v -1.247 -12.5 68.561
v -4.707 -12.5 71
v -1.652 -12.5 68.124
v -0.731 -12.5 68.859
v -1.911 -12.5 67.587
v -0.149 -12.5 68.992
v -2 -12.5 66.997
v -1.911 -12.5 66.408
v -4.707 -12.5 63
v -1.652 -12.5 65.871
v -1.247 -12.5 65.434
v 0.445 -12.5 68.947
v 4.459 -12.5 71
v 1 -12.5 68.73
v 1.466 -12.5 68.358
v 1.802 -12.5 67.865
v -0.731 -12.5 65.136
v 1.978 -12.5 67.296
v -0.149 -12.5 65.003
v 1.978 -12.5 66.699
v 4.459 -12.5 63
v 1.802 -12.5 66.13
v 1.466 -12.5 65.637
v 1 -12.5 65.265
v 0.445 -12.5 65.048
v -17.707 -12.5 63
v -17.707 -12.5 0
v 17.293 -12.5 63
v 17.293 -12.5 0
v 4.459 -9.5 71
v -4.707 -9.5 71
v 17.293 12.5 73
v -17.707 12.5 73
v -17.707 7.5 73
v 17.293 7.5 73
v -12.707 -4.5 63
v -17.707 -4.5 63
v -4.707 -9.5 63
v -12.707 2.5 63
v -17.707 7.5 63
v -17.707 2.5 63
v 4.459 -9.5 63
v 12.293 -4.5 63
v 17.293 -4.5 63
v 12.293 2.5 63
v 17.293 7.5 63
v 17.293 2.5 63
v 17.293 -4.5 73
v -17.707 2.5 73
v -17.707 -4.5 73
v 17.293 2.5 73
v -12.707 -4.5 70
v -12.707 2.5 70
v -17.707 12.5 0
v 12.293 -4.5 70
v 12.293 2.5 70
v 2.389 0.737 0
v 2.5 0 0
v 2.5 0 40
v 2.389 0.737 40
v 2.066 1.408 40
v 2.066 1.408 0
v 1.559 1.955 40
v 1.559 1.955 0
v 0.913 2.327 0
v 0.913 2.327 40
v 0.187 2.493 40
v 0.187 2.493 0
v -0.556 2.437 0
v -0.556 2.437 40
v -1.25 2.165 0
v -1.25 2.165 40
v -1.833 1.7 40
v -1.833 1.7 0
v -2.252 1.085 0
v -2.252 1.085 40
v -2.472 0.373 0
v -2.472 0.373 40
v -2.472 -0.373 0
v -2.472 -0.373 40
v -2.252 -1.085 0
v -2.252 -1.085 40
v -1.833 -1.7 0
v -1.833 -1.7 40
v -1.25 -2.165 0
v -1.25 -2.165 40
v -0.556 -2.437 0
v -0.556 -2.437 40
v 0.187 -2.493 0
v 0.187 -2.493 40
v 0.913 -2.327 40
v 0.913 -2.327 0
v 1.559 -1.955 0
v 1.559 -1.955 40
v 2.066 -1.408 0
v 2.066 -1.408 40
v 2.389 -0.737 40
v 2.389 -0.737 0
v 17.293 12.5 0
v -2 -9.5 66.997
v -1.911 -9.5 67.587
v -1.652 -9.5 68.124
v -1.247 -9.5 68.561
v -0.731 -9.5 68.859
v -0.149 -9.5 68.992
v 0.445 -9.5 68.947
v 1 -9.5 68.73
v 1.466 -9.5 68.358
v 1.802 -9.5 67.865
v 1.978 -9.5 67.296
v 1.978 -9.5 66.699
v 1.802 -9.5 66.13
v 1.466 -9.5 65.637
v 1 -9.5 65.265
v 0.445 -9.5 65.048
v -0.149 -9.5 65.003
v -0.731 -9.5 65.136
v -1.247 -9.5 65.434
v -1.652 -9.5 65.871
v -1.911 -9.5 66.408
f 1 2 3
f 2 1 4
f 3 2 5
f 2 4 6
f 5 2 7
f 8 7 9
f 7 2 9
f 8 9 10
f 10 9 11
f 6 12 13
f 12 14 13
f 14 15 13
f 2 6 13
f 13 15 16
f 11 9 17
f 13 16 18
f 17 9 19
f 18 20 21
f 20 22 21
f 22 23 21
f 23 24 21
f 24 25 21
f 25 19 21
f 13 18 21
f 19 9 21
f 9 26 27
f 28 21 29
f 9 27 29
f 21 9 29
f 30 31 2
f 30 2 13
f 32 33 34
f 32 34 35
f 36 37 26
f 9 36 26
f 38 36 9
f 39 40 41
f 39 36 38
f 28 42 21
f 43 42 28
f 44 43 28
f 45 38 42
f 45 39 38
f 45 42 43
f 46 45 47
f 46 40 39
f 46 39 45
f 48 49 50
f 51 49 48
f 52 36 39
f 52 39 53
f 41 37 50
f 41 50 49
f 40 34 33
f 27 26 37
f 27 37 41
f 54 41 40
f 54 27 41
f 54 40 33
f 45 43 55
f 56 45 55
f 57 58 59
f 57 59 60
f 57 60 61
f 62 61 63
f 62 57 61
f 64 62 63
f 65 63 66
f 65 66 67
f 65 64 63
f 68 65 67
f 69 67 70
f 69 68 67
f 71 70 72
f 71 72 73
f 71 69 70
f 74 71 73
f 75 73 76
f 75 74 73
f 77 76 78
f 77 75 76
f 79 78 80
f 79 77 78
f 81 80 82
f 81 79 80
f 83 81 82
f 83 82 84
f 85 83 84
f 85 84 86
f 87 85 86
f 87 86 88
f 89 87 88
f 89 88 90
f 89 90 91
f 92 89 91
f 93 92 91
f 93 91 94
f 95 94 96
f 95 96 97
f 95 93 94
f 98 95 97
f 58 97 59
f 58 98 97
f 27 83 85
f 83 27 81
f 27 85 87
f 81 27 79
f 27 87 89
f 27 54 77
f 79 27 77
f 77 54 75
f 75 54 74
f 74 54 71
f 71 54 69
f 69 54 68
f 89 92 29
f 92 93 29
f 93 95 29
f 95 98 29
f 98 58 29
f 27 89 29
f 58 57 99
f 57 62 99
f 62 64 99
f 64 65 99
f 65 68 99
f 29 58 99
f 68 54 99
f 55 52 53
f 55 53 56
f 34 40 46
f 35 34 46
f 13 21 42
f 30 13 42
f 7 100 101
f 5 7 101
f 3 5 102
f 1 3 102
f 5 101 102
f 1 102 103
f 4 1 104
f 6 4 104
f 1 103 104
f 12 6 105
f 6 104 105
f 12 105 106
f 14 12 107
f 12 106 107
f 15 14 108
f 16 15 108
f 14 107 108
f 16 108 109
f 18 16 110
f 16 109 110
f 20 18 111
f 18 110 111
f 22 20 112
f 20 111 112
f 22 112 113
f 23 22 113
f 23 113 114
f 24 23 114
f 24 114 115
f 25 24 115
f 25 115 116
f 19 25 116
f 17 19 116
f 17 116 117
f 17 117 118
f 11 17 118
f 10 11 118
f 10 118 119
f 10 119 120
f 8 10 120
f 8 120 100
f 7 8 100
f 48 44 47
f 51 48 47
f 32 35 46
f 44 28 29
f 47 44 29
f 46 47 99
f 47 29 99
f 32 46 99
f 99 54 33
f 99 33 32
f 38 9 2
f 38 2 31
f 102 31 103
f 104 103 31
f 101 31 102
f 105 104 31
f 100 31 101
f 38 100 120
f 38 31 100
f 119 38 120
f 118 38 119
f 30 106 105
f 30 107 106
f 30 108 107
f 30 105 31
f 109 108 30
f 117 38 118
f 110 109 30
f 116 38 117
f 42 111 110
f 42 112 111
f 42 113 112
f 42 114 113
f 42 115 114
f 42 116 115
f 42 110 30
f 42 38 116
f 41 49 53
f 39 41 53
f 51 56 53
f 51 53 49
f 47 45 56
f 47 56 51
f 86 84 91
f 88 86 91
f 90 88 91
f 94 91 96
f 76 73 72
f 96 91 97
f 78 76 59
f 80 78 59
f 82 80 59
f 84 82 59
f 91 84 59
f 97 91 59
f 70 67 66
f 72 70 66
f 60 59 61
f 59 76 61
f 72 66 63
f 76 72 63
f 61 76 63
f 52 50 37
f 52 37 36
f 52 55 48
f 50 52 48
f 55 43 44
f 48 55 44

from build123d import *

# Parameters (mm, degrees)
F0_W      = 35
F0_H      = 25
F0_R      = 2.5
F1_DEPTH  = 40
F2_W      = 35
F2_H      = 25
F3_DEPTH  = 23
F4_W      = 35
F4_H      = 5
F5_DEPTH  = 10
F6_W      = 35
F6_H      = 7
F7_DEPTH  = 10
F8_W      = 25
F8_H      = 7
F9_DEPTH  = 7
F10_W     = 9.1652874053
F10_H     = 3
F11_DEPTH = 8
F14_D     = 4
F14_DEPTH = 3.001


with BuildPart() as f1:
    # F0 (on Top) → F1 (new body)
    with BuildSketch(Plane.XY):
        with Locations((-0.2066092566, 0)):
            Rectangle(F0_W, F0_H)
        Circle(F0_R, mode=Mode.SUBTRACT)
    extrude(amount=F1_DEPTH)

    # F2 (on face) → F3 (join)
    with BuildSketch(Plane.XY.offset(40)):
        with Locations((-0.2066092566, 0)):
            Rectangle(F2_W, F2_H)
    extrude(amount=F3_DEPTH)

    # F4 (on face) → F5 (join)
    with BuildSketch(Plane.XY.offset(63)):
        with Locations((-0.2066092566, 10)):
            Rectangle(F4_W, F4_H)
    extrude(amount=F5_DEPTH)

    # F6 (on face) → F7 (join)
    with BuildSketch(Plane.XY.offset(63)):
        with Locations((-0.2066092566, -1)):
            Rectangle(F6_W, F6_H)
    extrude(amount=F7_DEPTH)

    # F8 (on face) → F9 (cut)
    with BuildSketch(Plane.XZ.offset(4.5)):
        with Locations((-0.2066092566, 66.5)):
            Rectangle(F8_W, F8_H)
    extrude(amount=-F9_DEPTH, mode=Mode.SUBTRACT)

    # F10 (on face) → F11 (join)
    with BuildSketch(Plane.XY.offset(63)):
        with Locations((-0.1239655539, -11)):
            Rectangle(F10_W, F10_H)
    extrude(amount=F11_DEPTH)

    # F14 (through all, one way)
    with BuildSketch(Plane(origin=(0, -9.5, 0), x_dir=(-1, 0, 0), z_dir=(0, 1, 0))):
        with Locations((0, 66.9974908233)):
            Circle(F14_D / 2)
    extrude(amount=-F14_DEPTH, mode=Mode.SUBTRACT)


solid = f1.part
